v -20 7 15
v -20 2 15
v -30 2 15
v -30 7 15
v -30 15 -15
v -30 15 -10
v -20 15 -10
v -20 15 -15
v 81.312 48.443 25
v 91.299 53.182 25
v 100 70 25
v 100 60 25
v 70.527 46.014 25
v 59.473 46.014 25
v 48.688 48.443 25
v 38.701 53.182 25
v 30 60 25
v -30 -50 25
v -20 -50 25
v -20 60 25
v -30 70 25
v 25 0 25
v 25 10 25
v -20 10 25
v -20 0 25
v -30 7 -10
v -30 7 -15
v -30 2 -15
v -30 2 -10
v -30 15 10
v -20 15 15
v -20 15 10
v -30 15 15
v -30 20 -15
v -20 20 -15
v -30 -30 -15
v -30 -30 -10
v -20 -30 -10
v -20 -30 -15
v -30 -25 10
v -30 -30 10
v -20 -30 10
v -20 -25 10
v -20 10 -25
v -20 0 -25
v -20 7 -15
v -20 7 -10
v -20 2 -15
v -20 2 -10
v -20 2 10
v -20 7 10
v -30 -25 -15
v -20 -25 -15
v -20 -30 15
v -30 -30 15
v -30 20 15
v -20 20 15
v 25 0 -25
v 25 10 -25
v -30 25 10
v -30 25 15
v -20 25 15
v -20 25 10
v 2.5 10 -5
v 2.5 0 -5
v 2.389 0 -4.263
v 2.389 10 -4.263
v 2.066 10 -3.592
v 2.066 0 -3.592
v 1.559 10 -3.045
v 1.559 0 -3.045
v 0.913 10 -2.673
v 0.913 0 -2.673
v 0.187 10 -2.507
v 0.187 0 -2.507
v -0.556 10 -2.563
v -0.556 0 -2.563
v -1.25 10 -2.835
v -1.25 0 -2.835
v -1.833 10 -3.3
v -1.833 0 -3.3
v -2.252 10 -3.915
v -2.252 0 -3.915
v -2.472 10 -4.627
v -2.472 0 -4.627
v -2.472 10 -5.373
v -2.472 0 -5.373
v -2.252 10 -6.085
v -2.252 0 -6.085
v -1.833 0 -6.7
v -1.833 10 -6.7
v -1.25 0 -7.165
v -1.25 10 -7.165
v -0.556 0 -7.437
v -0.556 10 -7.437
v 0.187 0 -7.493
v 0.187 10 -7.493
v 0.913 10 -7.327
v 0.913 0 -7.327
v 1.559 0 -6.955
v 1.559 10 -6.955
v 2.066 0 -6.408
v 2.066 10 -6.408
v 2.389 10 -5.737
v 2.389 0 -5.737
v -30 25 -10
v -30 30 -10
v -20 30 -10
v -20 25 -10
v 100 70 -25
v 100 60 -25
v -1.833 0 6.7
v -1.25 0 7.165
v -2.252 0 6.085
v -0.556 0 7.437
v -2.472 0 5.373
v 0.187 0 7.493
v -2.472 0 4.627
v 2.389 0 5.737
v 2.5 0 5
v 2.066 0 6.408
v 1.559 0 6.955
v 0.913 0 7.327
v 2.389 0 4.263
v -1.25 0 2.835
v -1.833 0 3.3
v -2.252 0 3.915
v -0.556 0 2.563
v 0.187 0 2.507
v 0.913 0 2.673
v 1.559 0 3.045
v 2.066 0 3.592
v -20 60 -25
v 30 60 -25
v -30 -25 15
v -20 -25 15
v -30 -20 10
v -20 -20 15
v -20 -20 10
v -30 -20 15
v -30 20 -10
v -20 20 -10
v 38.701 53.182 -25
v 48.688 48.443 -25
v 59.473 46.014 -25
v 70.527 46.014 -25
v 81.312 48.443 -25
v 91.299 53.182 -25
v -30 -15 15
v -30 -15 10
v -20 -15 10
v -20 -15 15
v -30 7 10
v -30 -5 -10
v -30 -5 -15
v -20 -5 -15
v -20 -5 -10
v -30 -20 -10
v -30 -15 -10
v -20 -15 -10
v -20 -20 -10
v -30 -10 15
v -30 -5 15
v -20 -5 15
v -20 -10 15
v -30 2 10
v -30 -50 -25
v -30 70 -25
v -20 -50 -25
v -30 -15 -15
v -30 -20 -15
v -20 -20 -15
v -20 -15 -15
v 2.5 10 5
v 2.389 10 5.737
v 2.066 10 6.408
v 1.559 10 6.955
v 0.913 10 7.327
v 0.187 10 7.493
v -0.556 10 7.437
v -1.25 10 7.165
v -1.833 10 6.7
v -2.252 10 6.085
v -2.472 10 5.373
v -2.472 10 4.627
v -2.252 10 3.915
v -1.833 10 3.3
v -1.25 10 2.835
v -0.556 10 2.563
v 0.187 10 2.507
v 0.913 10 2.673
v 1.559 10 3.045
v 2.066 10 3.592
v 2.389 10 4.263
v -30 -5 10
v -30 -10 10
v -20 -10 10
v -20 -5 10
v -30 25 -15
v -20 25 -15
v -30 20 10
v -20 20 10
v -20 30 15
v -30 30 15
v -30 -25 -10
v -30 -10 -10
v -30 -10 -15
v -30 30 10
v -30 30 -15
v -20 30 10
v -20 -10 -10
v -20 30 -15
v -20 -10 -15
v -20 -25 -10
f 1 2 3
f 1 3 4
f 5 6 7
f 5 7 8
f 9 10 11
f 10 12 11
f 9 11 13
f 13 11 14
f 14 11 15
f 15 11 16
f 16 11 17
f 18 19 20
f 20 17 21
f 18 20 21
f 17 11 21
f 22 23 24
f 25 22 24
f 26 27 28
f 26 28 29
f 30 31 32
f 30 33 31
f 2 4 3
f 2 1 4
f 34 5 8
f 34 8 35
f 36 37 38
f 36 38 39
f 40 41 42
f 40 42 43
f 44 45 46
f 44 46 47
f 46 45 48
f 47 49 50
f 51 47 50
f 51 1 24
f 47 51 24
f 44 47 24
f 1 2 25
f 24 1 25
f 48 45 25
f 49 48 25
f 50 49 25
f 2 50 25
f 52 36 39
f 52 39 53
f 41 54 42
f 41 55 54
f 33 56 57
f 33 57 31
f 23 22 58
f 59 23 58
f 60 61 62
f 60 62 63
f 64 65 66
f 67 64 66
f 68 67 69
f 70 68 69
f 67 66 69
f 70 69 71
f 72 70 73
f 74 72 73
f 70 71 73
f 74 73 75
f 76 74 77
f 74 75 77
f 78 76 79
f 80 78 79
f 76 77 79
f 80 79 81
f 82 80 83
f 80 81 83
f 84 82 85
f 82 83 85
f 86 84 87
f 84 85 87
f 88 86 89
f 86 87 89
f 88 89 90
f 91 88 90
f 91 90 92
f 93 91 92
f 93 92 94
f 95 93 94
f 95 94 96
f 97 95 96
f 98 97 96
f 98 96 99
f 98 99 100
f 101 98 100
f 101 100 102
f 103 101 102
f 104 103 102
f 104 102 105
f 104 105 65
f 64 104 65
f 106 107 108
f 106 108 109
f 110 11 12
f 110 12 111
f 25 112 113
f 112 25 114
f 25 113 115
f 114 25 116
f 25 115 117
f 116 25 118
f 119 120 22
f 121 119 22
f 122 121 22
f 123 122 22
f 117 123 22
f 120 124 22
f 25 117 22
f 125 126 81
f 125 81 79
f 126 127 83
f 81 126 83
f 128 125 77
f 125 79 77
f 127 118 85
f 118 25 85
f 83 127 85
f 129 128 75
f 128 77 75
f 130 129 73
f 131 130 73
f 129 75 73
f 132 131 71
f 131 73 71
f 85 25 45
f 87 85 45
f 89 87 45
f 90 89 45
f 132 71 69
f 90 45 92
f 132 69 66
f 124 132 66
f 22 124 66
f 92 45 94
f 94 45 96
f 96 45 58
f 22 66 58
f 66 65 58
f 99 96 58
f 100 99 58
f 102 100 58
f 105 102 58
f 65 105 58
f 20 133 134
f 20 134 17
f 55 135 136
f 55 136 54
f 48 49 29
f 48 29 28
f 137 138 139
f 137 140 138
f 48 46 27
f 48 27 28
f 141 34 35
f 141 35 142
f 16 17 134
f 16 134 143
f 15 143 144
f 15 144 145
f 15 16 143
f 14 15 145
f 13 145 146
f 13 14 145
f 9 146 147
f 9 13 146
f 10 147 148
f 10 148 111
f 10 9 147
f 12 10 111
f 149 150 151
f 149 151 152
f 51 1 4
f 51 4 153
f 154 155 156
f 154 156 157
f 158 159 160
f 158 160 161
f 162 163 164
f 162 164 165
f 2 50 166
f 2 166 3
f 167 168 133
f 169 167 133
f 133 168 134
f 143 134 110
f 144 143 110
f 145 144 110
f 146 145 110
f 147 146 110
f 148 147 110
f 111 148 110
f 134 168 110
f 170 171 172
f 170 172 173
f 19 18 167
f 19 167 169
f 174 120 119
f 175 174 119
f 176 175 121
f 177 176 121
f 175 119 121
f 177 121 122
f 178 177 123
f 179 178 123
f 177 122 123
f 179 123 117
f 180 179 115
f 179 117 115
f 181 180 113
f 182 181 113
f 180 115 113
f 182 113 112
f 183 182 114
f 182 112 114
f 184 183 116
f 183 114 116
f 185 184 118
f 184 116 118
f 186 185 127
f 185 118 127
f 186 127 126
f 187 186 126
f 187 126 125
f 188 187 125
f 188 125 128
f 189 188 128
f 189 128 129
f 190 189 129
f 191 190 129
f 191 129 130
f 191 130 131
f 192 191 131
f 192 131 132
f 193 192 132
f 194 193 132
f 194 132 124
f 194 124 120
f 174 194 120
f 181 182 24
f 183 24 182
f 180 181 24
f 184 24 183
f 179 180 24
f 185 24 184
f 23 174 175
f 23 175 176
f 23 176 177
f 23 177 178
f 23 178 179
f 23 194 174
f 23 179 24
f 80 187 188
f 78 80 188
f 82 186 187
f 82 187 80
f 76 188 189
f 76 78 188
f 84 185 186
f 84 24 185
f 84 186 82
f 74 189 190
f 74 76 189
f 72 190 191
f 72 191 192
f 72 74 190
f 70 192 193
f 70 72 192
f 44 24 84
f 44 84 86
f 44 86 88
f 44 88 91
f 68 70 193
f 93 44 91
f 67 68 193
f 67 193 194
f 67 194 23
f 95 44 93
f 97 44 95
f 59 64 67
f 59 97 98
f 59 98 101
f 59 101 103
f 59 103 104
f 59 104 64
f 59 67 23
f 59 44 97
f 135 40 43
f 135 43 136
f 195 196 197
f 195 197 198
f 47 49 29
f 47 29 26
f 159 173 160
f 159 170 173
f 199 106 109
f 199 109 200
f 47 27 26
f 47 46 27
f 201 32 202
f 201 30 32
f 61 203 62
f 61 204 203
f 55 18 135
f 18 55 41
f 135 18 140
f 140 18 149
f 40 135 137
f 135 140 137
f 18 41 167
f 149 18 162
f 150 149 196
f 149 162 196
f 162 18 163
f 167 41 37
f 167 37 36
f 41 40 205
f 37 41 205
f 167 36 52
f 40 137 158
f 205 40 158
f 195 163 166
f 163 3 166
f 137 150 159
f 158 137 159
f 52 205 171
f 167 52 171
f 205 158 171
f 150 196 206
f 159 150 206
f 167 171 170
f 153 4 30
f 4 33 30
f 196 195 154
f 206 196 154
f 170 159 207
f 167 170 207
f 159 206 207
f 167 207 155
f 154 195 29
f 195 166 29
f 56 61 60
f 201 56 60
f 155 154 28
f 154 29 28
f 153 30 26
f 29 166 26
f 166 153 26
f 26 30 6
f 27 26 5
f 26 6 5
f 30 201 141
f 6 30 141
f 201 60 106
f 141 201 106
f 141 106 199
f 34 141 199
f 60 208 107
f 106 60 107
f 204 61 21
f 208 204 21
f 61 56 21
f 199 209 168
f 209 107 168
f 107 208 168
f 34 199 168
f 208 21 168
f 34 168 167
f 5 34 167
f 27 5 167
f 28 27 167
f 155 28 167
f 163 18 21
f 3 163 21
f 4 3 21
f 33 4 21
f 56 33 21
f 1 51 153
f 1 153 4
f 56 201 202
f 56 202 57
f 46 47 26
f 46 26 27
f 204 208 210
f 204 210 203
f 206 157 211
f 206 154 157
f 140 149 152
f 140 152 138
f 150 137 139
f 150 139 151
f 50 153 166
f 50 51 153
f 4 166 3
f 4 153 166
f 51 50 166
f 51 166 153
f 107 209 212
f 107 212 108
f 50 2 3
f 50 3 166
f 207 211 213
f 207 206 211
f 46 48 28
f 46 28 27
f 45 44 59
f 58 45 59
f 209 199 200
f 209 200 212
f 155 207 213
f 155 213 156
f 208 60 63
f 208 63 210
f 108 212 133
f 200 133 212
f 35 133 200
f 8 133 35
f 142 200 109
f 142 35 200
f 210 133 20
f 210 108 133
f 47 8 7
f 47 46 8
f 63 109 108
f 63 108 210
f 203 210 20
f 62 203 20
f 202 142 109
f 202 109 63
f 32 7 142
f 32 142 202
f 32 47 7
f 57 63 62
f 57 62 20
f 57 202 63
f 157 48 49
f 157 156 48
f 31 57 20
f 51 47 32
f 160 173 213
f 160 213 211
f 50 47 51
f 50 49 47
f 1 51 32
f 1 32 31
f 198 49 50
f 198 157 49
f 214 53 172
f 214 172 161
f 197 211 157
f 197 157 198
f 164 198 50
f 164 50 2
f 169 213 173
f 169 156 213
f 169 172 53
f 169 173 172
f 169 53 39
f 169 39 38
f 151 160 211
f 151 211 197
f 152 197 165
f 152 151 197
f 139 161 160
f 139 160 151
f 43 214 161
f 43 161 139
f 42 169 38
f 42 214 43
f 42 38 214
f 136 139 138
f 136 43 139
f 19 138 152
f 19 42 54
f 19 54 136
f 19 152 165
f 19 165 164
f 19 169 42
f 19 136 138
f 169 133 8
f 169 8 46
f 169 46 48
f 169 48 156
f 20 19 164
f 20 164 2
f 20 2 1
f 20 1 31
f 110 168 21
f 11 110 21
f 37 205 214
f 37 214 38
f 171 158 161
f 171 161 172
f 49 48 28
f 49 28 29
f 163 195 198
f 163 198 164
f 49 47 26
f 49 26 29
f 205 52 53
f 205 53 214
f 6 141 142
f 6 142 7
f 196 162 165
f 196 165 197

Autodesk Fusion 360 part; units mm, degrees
sketch "草图1" plane through (0, 0, 0) normal (0, 1, 0) x (1, 0, 0) in component "Component"
  line L0 (-30, 25) -> (30, 25)
  line L1 (30, 25) -> (30, -25)
  line L2 (30, -25) -> (-30, -25)
  line L3 (-30, -25) -> (-30, 25)
  line L4 (-30, 25) -> (30, -25) construction
  line L5 (30, 25) -> (-30, -25) construction
  dimension "d1" = 60
  dimension "d2" = 50
extrude "拉伸1" add sketch "草图1" along normal blind 10 makes body 1 in component "Component"
sketch "草图2" plane through (0, 10, 0) normal (0, 1, 0) x (-1, 0, 0) in component "Component"
  line L0 (30, 25) -> (-30, 25)
  line L1 (-30, 25) -> (-30, -25)
  line L2 (-30, -25) -> (30, -25)
  line L3 (30, -25) -> (30, 25)
  line L4 (30, -25) -> (20, -25)
  line L5 (20, -25) -> (20, 25)
  line L6 (20, 25) -> (30, 25)
  line L7 (30, 25) -> (30, -25)
  dimension "d5" = 10
extrude "拉伸2" add sketch "草图2" along normal blind 60 contours L0 L2 L3 L4 L5 L6 L7 bodies 1 in component "Component"
sketch "草图3" plane through (-20, 0, 0) normal (1, 0, 0) x (0, 0, -1) in component "Component"
  line L0 (-25, 10) -> (25, 10)
  line L1 (25, 10) -> (25, 70)
  line L2 (25, 70) -> (-25, 70)
  line L3 (-25, 70) -> (-25, 10)
  line L4 (-25, 70) -> (25, 70)
  line L5 (25, 70) -> (25, 60)
  line L6 (25, 60) -> (-25, 60)
  line L7 (-25, 60) -> (-25, 70)
  dimension "d8" = 10
extrude "拉伸3" add sketch "草图3" along normal blind 120 contours L1 L2 L3 L4 L5 L6 L7 bodies 1 in component "Component"
sketch "草图1 (2)" plane through (0, 0, 25) normal (0, 0, 1) x (1, 0, 0)
  line L0 (-30, 0) -> (30, 0)
  line L1 (30, 0) -> (30, 10)
  line L2 (30, 10) -> (-20, 10)
  line L3 (-20, 10) -> (-20, 60)
  line L4 (-20, 60) -> (100, 60)
  line L5 (100, 60) -> (100, 70)
  line L6 (100, 70) -> (-30, 70)
  line L7 (-30, 70) -> (-30, 0)
  arc A0 (30, 60) -> (100, 60) centre (65, 95.7071) ccw
  dimension "d14" = 50
  dimension "d15" = 50
extrude "拉伸4" add sketch "草图1 (2)" against normal blind 50 contours L4 A0 bodies 1 in component "Component"
sketch "草图2 (2)" plane through (0, 0, 0) normal (0, -1, 0) x (1, 0, 0)
  line L0 (30, 25) -> (-30, 25)
  line L1 (-30, 25) -> (-30, -25)
  line L2 (-30, -25) -> (30, -25)
  line L3 (30, -25) -> (30, 25)
  line L4 (-20, -25) -> (-20, 25)
  line L5 (-30, 25) -> (-20, 25)
  line L6 (-20, 25) -> (-20, -25)
  line L7 (-20, -25) -> (-30, -25)
  line L8 (-30, -25) -> (-30, 25)
extrude "拉伸5" add sketch "草图2 (2)" along normal blind 50 contours L0 L1 L2 L4 L5 L6 L7 L8 bodies 1 in component "Component"
sketch "草图3 (2)" plane through (0, 0, 0) normal (0, -1, 0) x (1, 0, 0)
  line L0 (-20, 25) -> (-20, -25)
  line L1 (-20, -25) -> (30, -25)
  line L2 (30, -25) -> (30, 25)
  line L3 (30, 25) -> (-20, 25)
  dimension "d21" = 20
ref_plane "工作平面2" through (-20, 0, 0) normal (1, 0, 0) x (0, 1, 0)
split "分割1" by plane through (-20, 0, 0) normal (1, 0, 0) bodies 1 makes body 2 at (20, 70, -8.3333) makes body 3 at (-3.3333, 0, -8.3333) in component "Component"
combine "合并1" operation add target body 2 tool bodies 1 in component "Component"
sketch "草图4" plane through (-20, 0, 0) normal (-1, 0, 0) x (0, 0, 1)
  line L0 (25, 10) -> (-25, 10)
  line L1 (-25, 10) -> (-25, 0)
  line L2 (-25, 0) -> (25, 0)
  line L3 (25, 0) -> (25, 10)
  line L4 (-15, 7) -> (-10, 7)
  line L5 (-10, 7) -> (-10, 2)
  line L6 (-10, 2) -> (-15, 2)
  line L7 (-15, 2) -> (-15, 7)
  line L8 (10, 7) -> (15, 7)
  line L9 (15, 7) -> (15, 2)
  line L10 (15, 2) -> (10, 2)
  line L11 (10, 2) -> (10, 7)
  dimension "d24" = 5
  dimension "d25" = 5
  dimension "d26" = 5
  dimension "d27" = 10
  dimension "d28" = 3
  dimension "d29" = 5
  dimension "d30" = 5
  dimension "d31" = 10
  dimension "d32" = 3
extrude "拉伸6" add sketch "草图4" along normal blind 8 contours L4 L5 L6 L7 | L8 L9 L10 L11 bodies 3 in component "Component"
sketch "草图5" plane through (-20, 0, 0) normal (1, 0, 0) x (0, 0, -1)
  line L0 (25, 60) -> (-25, 60)
  line L1 (-25, 60) -> (-25, -50)
  line L2 (-25, -50) -> (25, -50)
  line L3 (25, -50) -> (25, 60)
  line L4 (-10, 2) -> (-15, 2)
  line L5 (-15, 2) -> (-15, 7)
  line L6 (-15, 7) -> (-10, 7)
  line L7 (-10, 7) -> (-10, 2)
  line L8 (15, 2) -> (10, 2)
  line L9 (10, 2) -> (10, 7)
  line L10 (10, 7) -> (15, 7)
  line L11 (15, 7) -> (15, 2)
  line L12 (-15, 7) -> (-10, 7)
  line L13 (-10, 7) -> (-10, 2)
  line L14 (-10, 2) -> (-15, 2)
  line L15 (-15, 2) -> (-15, 7)
  line L16 (10, 7) -> (15, 7)
  line L17 (15, 7) -> (15, 2)
  line L18 (15, 2) -> (10, 2)
  line L19 (10, 2) -> (10, 7)
extrude "拉伸7" cut sketch "草图5" against normal blind 10 contours L4 L5 L6 L7 L12 L13 L14 L15 | L8 L9 L10 L11 L16 L17 L18 L19 bodies 2 in component "Component"
extrude "拉伸8" add 2 faces at (-28, 5.3333, 11.6667) (-28, 5.3333, -13.3333) along direction (-1, 0, 0) blind 2 on bodies 3 bodies 3 in component "Component"
sketch "草图6" plane through (-30, 0, 0) normal (-1, 0, 0) x (0, 0, 1)
  line L0 (10, 2) -> (10, 7)
  line L1 (10, 7) -> (15, 7)
  line L2 (15, 7) -> (15, 2)
  line L3 (15, 2) -> (10, 2)
  line L4 (-15, 2) -> (-15, 7)
  line L5 (-15, 7) -> (-10, 7)
  line L6 (-10, 7) -> (-10, 2)
  line L7 (-10, 2) -> (-15, 2)
  line L8 (25, -50) -> (25, 70)
  line L9 (25, 70) -> (-25, 70)
  line L10 (-25, 70) -> (-25, -50)
  line L11 (-25, -50) -> (25, -50)
  line L12 (-15, 20) -> (-10, 20)
  line L13 (-10, 20) -> (-10, 15)
  line L14 (-10, 15) -> (-15, 15)
  line L15 (-15, 15) -> (-15, 20)
  line L16 (10, 20) -> (15, 20)
  line L17 (15, 20) -> (15, 15)
  line L18 (15, 15) -> (10, 15)
  line L19 (10, 15) -> (10, 20)
  line L20 (-15, 30) -> (-10, 30)
  line L21 (-10, 30) -> (-10, 25)
  line L22 (-10, 25) -> (-15, 25)
  line L23 (-15, 25) -> (-15, 30)
  line L24 (10, 30) -> (15, 30)
  line L25 (15, 30) -> (15, 25)
  line L26 (15, 25) -> (10, 25)
  line L27 (10, 25) -> (10, 30)
  line L28 (-15, -5) -> (-10, -5)
  line L29 (-10, -5) -> (-10, -10)
  line L30 (-10, -10) -> (-15, -10)
  line L31 (-15, -10) -> (-15, -5)
  line L32 (10, -5) -> (15, -5)
  line L33 (15, -5) -> (15, -10)
  line L34 (15, -10) -> (10, -10)
  line L35 (10, -10) -> (10, -5)
  line L36 (-15, -15) -> (-10, -15)
  line L37 (-10, -15) -> (-10, -20)
  line L38 (-10, -20) -> (-15, -20)
  line L39 (-15, -20) -> (-15, -15)
  line L40 (10, -15) -> (15, -15)
  line L41 (15, -15) -> (15, -20)
  line L42 (15, -20) -> (10, -20)
  line L43 (10, -20) -> (10, -15)
  line L44 (-15, -25) -> (-10, -25)
  line L45 (-10, -25) -> (-10, -30)
  line L46 (-10, -30) -> (-15, -30)
  line L47 (-15, -30) -> (-15, -25)
  line L48 (10, -25) -> (15, -25)
  line L49 (15, -25) -> (15, -30)
  line L50 (15, -30) -> (10, -30)
  line L51 (10, -30) -> (10, -25)
  dimension "d39" = 5
  dimension "d40" = 5
  dimension "d41" = 5
  dimension "d42" = 5
  dimension "d43" = 5
  dimension "d44" = 5
  dimension "d45" = 5
  dimension "d46" = 5
  dimension "d47" = 5
  dimension "d48" = 5
  dimension "d49" = 5
  dimension "d50" = 5
  dimension "d51" = 5
  dimension "d52" = 5
  dimension "d53" = 5
  dimension "d54" = 5
  dimension "d55" = 5
  dimension "d56" = 5
  dimension "d57" = 15
  dimension "d58" = 10
  dimension "d59" = 20
  dimension "d60" = 5
  dimension "d61" = 5
  dimension "d62" = 30
  dimension "d64" = 15
extrude "拉伸9" cut sketch "草图6" against normal blind 10 contours L12 L13 L14 L15 | L16 L17 L18 L19 | L20 L21 L22 L23 | L24 L25 L26 L27 | L28 L29 L30 L31 | L32 L33 L34 L35 | L36 L37 L38 L39 | L40 L41 L42 L43 | L44 L45 L46 L47 | L48 L49 L50 L51 bodies 2 in component "Component"
sketch "草图7" plane through (0, 0, 0) normal (0, -1, 0) x (1, 0, 0)
  circle A0 centre (0, -5) radius 2.5
  circle A1 centre (0, 5) radius 2.5
  line L0 (1.75, 0) -> (22.5, 0)
  dimension "d67" = 5
  dimension "d68" = 5
  dimension "d69" = 10
extrude "拉伸10" cut sketch "草图7" against normal blind 10 bodies 3 in component "Component"
thread "螺纹2" "ISO Metric profile 5.0 M5x0.8 6H" major diameter 5.12 minor diameter 4.234 pitch 0.8 angle 60 resizes the face on face at (2.4969, 6.6667, -5.1246) on bodies 3 in component "Component"
thread "螺纹3" "ISO Metric profile 5.0 M5x0.8 6H" major diameter 5.12 minor diameter 4.234 pitch 0.8 angle 60 resizes the face on face at (2.4969, 6.6667, 4.8754) on bodies 3 in component "Component"
sketch "草图4 (2)" plane through (0, 0, 0) normal (0, -1, 0) x (1, 0, 0) in component "Component"
  line L0 (25, 25) -> (25, -25)
  line L1 (25, 25) -> (30, 25)
  line L2 (30, 25) -> (30, -25)
  line L3 (30, -25) -> (25, -25)
  point P0 (30, -25)
  dimension "d72" = 5
  dimension "d73" = 50
extrude "拉伸11" cut sketch "草图4 (2)" against normal blind 10 bodies 3 in component "Component"
component "Component" placed x (1, 0, 0) y (0, 1, 0) z (0, 0, 1) at (0, 0, 0)
